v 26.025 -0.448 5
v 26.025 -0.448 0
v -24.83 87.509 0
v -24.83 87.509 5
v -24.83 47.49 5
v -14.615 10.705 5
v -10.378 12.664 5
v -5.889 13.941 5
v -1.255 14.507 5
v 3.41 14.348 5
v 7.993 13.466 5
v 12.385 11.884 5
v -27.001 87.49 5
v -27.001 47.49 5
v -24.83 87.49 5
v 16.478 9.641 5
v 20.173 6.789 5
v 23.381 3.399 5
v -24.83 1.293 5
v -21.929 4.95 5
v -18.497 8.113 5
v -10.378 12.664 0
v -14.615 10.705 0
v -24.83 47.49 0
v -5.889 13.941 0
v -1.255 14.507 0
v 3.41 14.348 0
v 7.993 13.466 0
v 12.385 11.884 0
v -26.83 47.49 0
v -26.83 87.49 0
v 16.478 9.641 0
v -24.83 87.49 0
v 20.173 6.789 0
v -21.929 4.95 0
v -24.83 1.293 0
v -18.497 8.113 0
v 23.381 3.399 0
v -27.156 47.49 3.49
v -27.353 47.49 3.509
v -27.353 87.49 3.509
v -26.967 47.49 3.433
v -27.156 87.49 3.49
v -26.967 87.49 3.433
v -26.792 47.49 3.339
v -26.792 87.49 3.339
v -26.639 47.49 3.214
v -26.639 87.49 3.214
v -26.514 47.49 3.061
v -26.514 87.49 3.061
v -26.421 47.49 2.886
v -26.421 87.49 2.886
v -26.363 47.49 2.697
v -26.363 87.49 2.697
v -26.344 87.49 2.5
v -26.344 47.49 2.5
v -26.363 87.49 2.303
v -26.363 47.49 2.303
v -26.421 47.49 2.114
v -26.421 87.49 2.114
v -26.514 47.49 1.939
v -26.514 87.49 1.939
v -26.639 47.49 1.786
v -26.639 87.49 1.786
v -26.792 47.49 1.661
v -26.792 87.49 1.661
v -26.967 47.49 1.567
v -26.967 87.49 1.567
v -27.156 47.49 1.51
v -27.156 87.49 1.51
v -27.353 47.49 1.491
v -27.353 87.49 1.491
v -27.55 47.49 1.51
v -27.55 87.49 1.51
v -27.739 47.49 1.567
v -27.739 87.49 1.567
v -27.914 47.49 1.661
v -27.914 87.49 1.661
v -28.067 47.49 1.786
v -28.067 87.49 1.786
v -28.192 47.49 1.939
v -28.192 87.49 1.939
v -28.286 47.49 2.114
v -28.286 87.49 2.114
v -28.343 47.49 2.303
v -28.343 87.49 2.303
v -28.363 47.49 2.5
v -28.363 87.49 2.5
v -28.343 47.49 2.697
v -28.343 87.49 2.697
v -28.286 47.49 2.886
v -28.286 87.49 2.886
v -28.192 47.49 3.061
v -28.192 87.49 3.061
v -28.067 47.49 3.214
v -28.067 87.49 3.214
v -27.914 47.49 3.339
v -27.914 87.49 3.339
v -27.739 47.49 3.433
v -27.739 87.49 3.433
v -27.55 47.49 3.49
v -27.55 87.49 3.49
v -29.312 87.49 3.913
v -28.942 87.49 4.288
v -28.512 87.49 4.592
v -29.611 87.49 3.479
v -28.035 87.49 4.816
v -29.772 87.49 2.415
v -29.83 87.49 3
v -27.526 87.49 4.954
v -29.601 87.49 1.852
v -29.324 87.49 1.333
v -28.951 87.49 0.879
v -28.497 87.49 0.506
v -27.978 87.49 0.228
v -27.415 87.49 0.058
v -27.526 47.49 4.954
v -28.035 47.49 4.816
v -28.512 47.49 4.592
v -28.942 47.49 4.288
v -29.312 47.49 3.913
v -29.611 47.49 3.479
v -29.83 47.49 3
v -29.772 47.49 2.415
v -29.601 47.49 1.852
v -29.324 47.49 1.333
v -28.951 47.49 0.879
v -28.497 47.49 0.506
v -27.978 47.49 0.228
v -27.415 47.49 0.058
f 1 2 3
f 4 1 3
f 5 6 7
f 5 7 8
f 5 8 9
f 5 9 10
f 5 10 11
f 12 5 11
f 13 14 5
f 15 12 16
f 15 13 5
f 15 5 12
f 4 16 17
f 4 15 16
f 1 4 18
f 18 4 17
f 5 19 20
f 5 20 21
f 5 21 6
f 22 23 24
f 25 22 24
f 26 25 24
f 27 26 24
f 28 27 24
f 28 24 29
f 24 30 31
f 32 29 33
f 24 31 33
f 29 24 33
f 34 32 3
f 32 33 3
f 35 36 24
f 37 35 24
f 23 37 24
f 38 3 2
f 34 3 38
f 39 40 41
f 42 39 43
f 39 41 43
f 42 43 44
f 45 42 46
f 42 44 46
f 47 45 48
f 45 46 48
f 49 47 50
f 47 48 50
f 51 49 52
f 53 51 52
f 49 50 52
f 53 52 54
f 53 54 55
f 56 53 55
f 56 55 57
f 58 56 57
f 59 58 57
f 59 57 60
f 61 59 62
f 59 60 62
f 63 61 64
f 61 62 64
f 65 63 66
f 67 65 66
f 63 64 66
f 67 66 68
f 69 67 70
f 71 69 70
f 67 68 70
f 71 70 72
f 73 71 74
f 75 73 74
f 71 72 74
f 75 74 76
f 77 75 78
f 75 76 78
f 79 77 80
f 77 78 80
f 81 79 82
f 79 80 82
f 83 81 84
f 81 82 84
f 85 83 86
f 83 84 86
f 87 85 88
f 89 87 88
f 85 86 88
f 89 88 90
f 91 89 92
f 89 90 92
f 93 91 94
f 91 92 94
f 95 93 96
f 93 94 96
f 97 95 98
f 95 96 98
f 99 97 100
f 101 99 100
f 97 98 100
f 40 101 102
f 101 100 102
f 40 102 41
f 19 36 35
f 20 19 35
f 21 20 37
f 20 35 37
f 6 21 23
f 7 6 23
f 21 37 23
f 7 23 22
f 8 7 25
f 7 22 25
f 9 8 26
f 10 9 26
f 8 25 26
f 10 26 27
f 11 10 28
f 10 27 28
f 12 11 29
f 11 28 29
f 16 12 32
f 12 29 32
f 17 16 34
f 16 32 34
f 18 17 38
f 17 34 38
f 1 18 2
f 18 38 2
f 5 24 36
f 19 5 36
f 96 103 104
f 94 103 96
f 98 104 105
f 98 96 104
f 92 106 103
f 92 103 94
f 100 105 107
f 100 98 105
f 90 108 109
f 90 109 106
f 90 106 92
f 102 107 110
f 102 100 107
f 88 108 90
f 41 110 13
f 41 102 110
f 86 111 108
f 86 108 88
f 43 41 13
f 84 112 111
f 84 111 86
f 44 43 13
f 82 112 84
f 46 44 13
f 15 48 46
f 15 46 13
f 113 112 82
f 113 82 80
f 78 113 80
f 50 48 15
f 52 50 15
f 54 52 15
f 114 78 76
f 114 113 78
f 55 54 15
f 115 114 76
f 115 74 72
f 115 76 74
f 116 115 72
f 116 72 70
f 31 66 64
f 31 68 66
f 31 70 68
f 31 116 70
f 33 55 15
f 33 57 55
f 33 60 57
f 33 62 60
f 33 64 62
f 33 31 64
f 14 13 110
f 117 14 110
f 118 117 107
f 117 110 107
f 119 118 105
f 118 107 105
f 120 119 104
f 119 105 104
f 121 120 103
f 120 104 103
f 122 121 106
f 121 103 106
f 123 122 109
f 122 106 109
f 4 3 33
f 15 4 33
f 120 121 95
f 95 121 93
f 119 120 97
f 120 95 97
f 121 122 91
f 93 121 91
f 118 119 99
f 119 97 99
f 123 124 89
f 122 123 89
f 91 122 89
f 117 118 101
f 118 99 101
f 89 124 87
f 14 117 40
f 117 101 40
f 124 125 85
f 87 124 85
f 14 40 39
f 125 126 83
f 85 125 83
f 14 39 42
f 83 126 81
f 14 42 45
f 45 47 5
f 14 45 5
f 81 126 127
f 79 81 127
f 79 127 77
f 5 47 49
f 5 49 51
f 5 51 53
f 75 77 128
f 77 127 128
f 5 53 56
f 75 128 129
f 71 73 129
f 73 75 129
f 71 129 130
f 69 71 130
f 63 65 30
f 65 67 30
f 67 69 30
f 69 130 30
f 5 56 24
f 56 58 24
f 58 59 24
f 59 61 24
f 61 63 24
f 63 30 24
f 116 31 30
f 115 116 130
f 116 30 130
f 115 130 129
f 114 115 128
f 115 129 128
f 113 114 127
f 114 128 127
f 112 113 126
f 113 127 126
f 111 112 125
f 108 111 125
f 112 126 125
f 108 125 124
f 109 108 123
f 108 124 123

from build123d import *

# Parameters (mm, degrees)
BOSS_EXTRU_1_DEPTH      = 5
ESQUISSE9_W             = 5
ESQUISSE9_H             = 5
BOSS_EXTRU_3_DEPTH      = 40
ESQUISSE11_R            = 1.009332427
ENL_V_MAT_EXTRU_2_DEPTH = 40
CONG_1_R                = 3
CONG_2_R                = 3


with BuildPart() as part:
    # Esquisse1 → Boss.-Extru.1 (new body)
    with BuildSketch(Plane.XY):
        with BuildLine():
            Line((26.025021052, -0.447992933), (-24.829805977, 87.508811894))
            Line((-24.829805977, 87.508811894), (-24.829805977, 1.293439737))
            ThreePointArc((-24.829805977, 1.293439737), (1.080284786, 14.518282983), (26.025021052, -0.447992933))
        make_face()
    extrude(amount=BOSS_EXTRU_1_DEPTH)

    # Esquisse9 → Boss.-Extru.3 (add)
    with BuildSketch(Plane(origin=(0, 87.489884498, 0), x_dir=(1, 0, 0), z_dir=(0, 1, 0))):
        with Locations((-27.329805977, -2.5)):
            Rectangle(ESQUISSE9_W, ESQUISSE9_H)
    extrude(amount=-BOSS_EXTRU_3_DEPTH)

    # Esquisse11 → Enlèv. mat.-Extru.2 (cut)
    with BuildSketch(Plane(origin=(0, 87.489884498, 0), x_dir=(1, 0, 0), z_dir=(0, 1, 0))):
        with Locations(Location((-27.353173819, -2.5, 0), (0, 0, 270))):
            Circle(ESQUISSE11_R)
    extrude(amount=-ENL_V_MAT_EXTRU_2_DEPTH, mode=Mode.SUBTRACT)

    # Congé1
    cong_1_edges = [part.edges().sort_by_distance(p)[0] for p in [
        (-29.829805977, 67.489884498, 0),
    ]]
    fillet(cong_1_edges, radius=CONG_1_R)

    # Congé2
    # the kernel refuses this fillet: 3 mm, written as the material it takes off along each edge
    with BuildSketch(Plane(origin=(-29.829805977, 94.56095231, 5), x_dir=(0, 0, -1), z_dir=(0, -1, 0))) as cong_2_piece_1:
        with BuildLine():
            CenterArc((3, 2.828427125), CONG_2_R, 180, 70.528779366)
            Line((0, 2.828427125), (-0.06, 2.828427125))
            Line((-0.06, 2.828427125), (-0.06, 0))
            Line((-0.06, 0), (0, -0.06))
            ThreePointArc((0, -0.06), (1, -0.06), (1.98, -0.056568542))
            Line((1.98, -0.056568542), (2, 0))
        make_face()
    extrude(amount=54.142135624, mode=Mode.SUBTRACT)


solid = part.part
